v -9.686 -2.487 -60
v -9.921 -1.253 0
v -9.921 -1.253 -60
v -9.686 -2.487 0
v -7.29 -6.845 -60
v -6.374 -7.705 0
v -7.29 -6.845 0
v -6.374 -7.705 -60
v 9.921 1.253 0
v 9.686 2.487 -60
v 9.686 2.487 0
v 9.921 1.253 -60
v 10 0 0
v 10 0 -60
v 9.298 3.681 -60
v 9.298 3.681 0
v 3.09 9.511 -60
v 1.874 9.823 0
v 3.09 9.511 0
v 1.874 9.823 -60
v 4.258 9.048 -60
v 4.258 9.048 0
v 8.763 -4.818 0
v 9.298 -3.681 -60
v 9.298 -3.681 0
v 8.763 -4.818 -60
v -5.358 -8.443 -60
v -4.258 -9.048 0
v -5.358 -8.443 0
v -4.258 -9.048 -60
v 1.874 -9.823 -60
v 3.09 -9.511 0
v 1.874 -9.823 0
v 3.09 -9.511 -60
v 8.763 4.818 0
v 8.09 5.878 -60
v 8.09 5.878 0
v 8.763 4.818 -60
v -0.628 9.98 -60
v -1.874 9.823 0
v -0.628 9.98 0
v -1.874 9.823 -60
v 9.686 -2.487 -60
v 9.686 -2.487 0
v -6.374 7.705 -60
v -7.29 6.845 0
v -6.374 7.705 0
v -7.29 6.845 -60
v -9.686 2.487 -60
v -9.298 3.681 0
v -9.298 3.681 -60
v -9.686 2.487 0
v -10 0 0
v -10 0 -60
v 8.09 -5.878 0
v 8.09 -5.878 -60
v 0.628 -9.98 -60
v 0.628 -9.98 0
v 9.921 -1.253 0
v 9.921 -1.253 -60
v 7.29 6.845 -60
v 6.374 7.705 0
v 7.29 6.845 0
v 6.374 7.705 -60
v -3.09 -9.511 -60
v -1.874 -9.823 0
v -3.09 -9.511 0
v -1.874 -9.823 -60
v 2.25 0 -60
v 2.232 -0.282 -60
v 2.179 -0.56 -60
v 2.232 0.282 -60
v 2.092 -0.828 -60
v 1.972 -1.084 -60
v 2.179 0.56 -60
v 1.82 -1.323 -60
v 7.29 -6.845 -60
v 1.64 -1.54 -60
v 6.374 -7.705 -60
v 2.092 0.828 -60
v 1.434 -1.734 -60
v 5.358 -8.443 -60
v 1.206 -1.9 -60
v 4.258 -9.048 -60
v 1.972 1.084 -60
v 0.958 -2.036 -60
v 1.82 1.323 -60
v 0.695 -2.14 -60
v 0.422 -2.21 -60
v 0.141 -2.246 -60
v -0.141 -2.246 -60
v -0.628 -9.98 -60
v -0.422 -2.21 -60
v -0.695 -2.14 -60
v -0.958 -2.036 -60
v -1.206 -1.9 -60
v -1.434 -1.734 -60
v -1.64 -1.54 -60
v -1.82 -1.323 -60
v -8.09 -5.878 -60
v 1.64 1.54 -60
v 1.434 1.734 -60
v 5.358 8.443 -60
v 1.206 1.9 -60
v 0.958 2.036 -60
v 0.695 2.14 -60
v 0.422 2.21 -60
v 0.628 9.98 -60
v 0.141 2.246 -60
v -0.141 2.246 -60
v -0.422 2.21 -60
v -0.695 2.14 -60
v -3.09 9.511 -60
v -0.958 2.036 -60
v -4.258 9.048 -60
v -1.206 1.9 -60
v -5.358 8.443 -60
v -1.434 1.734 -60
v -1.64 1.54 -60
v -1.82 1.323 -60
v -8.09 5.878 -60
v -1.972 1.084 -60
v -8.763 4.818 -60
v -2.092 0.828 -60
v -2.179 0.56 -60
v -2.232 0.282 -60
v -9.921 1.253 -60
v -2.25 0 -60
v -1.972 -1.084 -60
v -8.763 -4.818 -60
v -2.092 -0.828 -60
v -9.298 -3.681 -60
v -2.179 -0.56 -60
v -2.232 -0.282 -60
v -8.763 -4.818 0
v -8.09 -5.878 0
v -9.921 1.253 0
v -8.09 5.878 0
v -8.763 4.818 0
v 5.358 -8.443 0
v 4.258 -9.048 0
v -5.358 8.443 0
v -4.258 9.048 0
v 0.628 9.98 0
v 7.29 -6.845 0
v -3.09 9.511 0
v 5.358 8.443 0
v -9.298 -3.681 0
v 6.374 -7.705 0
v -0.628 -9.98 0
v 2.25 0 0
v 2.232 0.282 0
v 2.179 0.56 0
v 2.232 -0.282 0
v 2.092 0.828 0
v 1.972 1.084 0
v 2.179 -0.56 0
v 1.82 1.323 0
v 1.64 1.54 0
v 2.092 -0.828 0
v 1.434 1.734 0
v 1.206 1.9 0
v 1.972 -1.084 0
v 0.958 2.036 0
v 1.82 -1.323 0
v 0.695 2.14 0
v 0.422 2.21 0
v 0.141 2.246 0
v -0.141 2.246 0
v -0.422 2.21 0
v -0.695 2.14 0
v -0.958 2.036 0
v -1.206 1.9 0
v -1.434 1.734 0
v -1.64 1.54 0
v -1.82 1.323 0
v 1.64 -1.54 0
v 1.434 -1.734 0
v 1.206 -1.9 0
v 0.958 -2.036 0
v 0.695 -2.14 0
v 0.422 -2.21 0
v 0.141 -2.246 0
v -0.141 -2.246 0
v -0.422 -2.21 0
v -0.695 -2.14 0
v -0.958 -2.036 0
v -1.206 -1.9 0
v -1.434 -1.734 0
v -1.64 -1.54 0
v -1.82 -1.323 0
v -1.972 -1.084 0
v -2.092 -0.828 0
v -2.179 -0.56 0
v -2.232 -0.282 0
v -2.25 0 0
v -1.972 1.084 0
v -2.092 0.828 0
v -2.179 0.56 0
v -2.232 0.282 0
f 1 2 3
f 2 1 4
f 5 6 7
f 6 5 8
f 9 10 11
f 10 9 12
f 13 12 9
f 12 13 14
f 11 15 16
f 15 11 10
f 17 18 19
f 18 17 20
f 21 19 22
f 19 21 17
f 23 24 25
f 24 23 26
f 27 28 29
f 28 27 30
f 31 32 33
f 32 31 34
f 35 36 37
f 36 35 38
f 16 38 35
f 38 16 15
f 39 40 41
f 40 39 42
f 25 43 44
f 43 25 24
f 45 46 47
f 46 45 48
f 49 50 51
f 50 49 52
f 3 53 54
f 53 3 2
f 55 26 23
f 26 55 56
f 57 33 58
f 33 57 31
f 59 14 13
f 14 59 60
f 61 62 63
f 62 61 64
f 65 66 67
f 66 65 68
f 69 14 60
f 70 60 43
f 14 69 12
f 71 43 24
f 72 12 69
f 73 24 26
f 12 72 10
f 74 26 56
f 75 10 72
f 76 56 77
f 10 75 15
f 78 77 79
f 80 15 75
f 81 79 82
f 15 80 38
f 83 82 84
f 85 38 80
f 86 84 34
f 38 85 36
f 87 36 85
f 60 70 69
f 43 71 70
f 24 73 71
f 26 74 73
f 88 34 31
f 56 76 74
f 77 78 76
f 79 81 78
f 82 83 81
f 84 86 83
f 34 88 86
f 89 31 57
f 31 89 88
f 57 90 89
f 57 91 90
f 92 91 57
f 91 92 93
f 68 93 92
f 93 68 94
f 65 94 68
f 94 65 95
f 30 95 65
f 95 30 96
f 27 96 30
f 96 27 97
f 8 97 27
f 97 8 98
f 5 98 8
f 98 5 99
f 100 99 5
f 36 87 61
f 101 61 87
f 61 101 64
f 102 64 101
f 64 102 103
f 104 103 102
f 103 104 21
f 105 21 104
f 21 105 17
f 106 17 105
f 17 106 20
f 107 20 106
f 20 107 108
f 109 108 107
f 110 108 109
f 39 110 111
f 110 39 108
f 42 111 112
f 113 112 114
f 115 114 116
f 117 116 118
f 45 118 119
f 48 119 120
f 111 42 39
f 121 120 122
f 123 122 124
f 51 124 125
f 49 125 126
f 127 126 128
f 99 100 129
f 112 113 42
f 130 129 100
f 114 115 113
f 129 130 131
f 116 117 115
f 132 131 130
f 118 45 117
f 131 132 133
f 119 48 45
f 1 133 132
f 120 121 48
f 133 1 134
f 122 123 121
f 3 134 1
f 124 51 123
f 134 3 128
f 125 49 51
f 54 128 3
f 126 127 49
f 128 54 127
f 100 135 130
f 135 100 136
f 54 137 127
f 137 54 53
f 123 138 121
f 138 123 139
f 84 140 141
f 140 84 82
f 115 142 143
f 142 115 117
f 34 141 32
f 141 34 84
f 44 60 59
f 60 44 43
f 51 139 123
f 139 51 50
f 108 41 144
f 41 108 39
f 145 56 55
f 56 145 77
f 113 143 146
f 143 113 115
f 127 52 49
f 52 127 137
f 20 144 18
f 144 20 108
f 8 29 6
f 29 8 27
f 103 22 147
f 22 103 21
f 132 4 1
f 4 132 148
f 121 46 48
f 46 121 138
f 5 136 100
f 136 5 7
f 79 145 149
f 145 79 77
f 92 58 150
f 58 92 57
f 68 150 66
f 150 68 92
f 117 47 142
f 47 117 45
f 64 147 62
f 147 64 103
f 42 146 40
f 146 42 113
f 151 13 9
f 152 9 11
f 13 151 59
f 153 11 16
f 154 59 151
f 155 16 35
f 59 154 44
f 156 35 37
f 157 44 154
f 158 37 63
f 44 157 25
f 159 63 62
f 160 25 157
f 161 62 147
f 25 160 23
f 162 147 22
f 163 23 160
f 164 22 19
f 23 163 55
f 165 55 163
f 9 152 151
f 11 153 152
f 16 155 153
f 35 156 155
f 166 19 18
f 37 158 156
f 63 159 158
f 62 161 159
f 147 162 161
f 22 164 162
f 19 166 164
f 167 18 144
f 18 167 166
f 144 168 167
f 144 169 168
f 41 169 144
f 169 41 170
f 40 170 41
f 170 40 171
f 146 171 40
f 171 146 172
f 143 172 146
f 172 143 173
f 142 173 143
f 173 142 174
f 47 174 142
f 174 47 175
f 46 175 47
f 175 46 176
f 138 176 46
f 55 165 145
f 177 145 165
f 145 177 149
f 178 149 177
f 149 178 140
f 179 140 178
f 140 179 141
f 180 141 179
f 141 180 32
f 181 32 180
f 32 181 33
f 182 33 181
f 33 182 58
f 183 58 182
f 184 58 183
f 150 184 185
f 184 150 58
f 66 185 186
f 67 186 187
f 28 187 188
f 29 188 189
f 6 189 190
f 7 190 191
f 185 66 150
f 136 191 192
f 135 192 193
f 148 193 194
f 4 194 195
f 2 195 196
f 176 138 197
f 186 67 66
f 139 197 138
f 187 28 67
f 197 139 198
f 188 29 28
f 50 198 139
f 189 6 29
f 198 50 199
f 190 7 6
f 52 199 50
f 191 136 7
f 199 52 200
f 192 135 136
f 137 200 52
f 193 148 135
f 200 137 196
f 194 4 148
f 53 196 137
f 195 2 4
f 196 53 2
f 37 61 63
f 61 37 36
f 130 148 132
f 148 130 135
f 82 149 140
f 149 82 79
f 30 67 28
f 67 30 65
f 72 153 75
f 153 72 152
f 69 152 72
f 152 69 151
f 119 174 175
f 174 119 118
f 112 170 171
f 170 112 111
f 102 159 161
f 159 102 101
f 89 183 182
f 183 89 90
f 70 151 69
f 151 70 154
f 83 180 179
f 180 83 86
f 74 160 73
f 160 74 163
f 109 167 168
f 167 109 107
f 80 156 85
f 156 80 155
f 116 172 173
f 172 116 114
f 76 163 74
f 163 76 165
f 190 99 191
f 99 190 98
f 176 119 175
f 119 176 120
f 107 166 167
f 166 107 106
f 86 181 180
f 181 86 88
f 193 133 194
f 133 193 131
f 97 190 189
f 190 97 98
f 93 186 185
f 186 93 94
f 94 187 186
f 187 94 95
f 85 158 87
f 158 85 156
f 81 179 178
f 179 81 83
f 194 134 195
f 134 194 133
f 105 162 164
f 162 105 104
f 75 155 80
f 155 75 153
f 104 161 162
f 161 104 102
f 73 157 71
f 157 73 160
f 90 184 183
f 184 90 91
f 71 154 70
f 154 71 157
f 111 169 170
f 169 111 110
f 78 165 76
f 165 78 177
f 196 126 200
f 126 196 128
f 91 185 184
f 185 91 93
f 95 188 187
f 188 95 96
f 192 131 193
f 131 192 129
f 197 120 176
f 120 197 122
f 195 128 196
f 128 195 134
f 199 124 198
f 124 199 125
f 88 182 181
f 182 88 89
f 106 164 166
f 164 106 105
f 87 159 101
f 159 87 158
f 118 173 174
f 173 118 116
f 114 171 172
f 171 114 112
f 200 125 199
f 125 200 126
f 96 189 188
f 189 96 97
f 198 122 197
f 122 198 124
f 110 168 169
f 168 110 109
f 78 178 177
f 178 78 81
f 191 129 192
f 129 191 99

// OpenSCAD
$fn = 50;


difference() {
	union() {
		translate(v = [0, 0, -60.0000000000]) {
			cylinder(h = 60, r = 10.0000000000);
		}
		cylinder(h = 0, r = 19.0000000000);
	}
	union() {
		#translate(v = [0, 0, -60]) {
			cylinder(h = 60, r = 2.2500000000);
		}
	}
}
